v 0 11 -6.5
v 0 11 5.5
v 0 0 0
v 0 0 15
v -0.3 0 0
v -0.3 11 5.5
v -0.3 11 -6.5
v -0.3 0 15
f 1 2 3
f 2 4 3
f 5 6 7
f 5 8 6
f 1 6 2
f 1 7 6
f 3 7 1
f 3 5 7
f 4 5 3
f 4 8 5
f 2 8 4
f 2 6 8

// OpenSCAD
module fin(root_chord, tip_chord, height, sweep, thickness)
{
    translate([0, 0, 15])
    rotate([-90, 0, 0])
    rotate([0, -90, 0])
    linear_extrude(thickness)
    polygon([[0, 0], [0, root_chord], [height, tip_chord+sweep], [height, sweep]]);
}


fin(15, 12, 11, 9.5, 0.3);
